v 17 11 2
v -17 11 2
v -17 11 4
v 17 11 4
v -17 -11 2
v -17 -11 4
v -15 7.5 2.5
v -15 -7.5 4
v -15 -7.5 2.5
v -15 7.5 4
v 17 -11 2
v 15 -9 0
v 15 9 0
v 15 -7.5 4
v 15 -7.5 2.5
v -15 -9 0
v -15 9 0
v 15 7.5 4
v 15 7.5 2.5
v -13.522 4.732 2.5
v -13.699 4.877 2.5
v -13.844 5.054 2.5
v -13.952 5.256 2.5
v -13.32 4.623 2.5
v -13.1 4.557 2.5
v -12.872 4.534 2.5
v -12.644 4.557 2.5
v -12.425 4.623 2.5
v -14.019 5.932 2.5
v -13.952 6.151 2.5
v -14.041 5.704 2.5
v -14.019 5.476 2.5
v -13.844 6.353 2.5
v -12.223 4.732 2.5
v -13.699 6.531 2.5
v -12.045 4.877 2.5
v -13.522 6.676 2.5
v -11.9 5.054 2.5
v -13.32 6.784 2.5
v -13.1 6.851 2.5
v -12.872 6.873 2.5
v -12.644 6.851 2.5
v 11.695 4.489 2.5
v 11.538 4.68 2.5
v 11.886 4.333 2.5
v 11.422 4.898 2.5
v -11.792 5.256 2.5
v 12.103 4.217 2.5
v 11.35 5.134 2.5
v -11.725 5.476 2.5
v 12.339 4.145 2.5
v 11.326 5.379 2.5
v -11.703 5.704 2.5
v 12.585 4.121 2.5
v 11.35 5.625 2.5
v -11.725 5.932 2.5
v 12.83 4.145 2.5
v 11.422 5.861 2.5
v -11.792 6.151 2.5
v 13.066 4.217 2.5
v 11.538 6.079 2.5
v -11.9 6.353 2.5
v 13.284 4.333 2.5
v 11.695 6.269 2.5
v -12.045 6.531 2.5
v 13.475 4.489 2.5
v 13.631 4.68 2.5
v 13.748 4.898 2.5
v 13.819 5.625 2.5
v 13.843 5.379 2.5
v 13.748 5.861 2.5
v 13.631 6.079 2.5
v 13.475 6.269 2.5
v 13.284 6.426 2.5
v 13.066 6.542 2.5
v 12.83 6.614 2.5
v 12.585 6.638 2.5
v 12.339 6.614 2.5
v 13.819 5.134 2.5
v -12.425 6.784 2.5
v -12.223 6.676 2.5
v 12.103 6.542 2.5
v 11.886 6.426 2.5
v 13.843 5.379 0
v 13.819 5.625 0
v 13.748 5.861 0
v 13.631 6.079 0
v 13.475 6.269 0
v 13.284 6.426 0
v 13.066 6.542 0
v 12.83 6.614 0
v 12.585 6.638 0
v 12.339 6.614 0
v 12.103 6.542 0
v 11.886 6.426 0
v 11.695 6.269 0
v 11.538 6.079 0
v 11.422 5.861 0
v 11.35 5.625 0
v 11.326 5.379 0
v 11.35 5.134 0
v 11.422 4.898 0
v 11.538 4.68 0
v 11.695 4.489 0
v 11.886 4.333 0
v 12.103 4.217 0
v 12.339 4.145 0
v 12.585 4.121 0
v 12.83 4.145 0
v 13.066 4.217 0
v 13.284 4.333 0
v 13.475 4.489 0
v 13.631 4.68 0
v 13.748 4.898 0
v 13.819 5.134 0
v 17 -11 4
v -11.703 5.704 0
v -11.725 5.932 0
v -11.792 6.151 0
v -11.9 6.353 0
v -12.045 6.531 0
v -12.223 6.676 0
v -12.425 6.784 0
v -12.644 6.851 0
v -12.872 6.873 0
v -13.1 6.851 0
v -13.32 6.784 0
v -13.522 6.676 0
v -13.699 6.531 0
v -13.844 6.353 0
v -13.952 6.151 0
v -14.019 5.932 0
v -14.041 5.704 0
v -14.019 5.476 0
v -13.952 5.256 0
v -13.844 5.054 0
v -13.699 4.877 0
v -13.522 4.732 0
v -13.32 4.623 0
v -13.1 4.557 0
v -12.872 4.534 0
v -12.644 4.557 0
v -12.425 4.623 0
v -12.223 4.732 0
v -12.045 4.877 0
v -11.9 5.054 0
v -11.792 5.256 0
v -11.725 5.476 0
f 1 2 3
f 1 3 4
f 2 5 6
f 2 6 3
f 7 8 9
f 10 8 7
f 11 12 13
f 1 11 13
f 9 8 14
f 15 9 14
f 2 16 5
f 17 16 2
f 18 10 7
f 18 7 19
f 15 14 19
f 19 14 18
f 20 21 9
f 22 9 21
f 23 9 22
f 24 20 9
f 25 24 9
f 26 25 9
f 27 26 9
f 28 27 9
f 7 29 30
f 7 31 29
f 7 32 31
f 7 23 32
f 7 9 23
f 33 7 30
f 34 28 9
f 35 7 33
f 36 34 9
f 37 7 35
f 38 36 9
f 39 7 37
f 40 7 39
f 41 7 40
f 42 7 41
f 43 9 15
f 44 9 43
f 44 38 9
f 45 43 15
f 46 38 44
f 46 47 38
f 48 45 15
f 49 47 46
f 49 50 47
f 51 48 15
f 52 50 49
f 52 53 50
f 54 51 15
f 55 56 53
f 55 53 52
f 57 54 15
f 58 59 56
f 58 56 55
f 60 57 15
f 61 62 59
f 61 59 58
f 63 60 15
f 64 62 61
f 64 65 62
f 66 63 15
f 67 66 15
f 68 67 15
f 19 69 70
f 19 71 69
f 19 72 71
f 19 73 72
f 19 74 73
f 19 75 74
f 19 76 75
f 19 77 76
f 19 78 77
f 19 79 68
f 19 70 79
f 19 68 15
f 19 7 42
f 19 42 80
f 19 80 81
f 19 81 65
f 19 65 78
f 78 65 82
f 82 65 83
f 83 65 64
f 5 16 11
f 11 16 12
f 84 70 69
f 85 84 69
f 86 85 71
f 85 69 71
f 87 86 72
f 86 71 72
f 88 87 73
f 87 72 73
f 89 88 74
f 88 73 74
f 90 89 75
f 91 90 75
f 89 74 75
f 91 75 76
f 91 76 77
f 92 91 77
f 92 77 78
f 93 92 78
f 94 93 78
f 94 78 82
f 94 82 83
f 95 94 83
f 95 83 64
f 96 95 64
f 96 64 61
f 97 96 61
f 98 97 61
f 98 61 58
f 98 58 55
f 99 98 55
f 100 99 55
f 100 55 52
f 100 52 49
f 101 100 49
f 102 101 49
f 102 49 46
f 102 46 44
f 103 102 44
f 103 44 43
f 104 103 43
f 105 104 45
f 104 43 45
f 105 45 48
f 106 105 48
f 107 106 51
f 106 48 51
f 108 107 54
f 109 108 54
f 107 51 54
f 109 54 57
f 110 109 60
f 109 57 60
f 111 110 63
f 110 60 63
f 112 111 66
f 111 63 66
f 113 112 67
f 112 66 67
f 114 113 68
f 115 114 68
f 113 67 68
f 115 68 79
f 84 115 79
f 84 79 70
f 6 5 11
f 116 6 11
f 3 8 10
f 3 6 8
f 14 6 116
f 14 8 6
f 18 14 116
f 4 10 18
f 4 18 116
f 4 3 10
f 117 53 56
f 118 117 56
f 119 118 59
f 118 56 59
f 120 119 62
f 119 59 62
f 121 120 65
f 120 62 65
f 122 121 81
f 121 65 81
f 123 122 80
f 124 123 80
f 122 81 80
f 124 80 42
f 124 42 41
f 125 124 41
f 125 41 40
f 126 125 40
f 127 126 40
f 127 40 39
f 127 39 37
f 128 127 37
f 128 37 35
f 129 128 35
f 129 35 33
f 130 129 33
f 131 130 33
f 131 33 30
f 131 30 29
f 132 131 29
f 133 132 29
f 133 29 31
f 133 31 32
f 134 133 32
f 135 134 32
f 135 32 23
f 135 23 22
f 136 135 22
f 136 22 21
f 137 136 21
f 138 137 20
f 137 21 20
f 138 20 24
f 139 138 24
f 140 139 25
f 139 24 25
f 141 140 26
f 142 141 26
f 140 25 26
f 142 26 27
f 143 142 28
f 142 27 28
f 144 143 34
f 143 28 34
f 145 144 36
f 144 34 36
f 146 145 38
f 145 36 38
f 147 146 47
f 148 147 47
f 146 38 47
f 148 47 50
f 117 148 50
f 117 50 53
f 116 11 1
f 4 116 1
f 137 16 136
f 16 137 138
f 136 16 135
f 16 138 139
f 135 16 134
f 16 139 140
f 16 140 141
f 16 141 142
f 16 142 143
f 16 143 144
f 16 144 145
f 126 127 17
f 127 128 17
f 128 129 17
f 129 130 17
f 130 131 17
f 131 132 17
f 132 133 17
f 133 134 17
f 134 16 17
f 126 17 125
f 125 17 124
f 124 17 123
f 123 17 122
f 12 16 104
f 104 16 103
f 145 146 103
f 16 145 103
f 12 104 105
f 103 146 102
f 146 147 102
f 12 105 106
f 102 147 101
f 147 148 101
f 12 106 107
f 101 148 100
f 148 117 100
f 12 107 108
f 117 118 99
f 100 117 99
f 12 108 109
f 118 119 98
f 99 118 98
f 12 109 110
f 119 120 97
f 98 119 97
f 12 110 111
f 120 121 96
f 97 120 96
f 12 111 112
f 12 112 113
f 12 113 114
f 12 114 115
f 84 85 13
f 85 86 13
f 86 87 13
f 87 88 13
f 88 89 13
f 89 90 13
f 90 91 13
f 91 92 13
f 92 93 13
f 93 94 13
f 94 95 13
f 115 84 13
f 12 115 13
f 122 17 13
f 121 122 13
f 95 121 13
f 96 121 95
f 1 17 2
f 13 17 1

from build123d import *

# Parameters (mm, degrees)
F0_W     = 34
F0_H     = 22
F1_DEPTH = 4
F2_SIZE  = 2
F3_W     = 30
F3_H     = 15
F4_DEPTH = 1.5
F5_R     = 1.169255
F5_R_2   = 1.258596
F6_DEPTH = 25


with BuildPart() as f1:
    # F0 (on Top) → F1 (new body)
    with BuildSketch(Plane.XY):
        Rectangle(F0_W, F0_H)
    extrude(amount=F1_DEPTH)

    # F2
    f2_edges = [f1.edges().sort_by_distance(p)[0] for p in [
        (-17, 0, 0),
        (17, 0, 0),
        (0, 11, 0),
        (0, -11, 0),
    ]]
    chamfer(f2_edges, length=F2_SIZE)

    # F3 (on face) → F4 (cut)
    with BuildSketch(Plane.XY.offset(4)):
        Rectangle(F3_W, F3_H)
    extrude(amount=-F4_DEPTH, mode=Mode.SUBTRACT)

    # F5 (on face) → F6 (cut)
    with BuildSketch(Plane.XY.offset(2.5)):
        with Locations((-12.872203, 5.703713)):
            Circle(F5_R)
        with Locations((12.584788, 5.37942)):
            Circle(F5_R_2)
    extrude(amount=-F6_DEPTH, mode=Mode.SUBTRACT)


solid = f1.part
